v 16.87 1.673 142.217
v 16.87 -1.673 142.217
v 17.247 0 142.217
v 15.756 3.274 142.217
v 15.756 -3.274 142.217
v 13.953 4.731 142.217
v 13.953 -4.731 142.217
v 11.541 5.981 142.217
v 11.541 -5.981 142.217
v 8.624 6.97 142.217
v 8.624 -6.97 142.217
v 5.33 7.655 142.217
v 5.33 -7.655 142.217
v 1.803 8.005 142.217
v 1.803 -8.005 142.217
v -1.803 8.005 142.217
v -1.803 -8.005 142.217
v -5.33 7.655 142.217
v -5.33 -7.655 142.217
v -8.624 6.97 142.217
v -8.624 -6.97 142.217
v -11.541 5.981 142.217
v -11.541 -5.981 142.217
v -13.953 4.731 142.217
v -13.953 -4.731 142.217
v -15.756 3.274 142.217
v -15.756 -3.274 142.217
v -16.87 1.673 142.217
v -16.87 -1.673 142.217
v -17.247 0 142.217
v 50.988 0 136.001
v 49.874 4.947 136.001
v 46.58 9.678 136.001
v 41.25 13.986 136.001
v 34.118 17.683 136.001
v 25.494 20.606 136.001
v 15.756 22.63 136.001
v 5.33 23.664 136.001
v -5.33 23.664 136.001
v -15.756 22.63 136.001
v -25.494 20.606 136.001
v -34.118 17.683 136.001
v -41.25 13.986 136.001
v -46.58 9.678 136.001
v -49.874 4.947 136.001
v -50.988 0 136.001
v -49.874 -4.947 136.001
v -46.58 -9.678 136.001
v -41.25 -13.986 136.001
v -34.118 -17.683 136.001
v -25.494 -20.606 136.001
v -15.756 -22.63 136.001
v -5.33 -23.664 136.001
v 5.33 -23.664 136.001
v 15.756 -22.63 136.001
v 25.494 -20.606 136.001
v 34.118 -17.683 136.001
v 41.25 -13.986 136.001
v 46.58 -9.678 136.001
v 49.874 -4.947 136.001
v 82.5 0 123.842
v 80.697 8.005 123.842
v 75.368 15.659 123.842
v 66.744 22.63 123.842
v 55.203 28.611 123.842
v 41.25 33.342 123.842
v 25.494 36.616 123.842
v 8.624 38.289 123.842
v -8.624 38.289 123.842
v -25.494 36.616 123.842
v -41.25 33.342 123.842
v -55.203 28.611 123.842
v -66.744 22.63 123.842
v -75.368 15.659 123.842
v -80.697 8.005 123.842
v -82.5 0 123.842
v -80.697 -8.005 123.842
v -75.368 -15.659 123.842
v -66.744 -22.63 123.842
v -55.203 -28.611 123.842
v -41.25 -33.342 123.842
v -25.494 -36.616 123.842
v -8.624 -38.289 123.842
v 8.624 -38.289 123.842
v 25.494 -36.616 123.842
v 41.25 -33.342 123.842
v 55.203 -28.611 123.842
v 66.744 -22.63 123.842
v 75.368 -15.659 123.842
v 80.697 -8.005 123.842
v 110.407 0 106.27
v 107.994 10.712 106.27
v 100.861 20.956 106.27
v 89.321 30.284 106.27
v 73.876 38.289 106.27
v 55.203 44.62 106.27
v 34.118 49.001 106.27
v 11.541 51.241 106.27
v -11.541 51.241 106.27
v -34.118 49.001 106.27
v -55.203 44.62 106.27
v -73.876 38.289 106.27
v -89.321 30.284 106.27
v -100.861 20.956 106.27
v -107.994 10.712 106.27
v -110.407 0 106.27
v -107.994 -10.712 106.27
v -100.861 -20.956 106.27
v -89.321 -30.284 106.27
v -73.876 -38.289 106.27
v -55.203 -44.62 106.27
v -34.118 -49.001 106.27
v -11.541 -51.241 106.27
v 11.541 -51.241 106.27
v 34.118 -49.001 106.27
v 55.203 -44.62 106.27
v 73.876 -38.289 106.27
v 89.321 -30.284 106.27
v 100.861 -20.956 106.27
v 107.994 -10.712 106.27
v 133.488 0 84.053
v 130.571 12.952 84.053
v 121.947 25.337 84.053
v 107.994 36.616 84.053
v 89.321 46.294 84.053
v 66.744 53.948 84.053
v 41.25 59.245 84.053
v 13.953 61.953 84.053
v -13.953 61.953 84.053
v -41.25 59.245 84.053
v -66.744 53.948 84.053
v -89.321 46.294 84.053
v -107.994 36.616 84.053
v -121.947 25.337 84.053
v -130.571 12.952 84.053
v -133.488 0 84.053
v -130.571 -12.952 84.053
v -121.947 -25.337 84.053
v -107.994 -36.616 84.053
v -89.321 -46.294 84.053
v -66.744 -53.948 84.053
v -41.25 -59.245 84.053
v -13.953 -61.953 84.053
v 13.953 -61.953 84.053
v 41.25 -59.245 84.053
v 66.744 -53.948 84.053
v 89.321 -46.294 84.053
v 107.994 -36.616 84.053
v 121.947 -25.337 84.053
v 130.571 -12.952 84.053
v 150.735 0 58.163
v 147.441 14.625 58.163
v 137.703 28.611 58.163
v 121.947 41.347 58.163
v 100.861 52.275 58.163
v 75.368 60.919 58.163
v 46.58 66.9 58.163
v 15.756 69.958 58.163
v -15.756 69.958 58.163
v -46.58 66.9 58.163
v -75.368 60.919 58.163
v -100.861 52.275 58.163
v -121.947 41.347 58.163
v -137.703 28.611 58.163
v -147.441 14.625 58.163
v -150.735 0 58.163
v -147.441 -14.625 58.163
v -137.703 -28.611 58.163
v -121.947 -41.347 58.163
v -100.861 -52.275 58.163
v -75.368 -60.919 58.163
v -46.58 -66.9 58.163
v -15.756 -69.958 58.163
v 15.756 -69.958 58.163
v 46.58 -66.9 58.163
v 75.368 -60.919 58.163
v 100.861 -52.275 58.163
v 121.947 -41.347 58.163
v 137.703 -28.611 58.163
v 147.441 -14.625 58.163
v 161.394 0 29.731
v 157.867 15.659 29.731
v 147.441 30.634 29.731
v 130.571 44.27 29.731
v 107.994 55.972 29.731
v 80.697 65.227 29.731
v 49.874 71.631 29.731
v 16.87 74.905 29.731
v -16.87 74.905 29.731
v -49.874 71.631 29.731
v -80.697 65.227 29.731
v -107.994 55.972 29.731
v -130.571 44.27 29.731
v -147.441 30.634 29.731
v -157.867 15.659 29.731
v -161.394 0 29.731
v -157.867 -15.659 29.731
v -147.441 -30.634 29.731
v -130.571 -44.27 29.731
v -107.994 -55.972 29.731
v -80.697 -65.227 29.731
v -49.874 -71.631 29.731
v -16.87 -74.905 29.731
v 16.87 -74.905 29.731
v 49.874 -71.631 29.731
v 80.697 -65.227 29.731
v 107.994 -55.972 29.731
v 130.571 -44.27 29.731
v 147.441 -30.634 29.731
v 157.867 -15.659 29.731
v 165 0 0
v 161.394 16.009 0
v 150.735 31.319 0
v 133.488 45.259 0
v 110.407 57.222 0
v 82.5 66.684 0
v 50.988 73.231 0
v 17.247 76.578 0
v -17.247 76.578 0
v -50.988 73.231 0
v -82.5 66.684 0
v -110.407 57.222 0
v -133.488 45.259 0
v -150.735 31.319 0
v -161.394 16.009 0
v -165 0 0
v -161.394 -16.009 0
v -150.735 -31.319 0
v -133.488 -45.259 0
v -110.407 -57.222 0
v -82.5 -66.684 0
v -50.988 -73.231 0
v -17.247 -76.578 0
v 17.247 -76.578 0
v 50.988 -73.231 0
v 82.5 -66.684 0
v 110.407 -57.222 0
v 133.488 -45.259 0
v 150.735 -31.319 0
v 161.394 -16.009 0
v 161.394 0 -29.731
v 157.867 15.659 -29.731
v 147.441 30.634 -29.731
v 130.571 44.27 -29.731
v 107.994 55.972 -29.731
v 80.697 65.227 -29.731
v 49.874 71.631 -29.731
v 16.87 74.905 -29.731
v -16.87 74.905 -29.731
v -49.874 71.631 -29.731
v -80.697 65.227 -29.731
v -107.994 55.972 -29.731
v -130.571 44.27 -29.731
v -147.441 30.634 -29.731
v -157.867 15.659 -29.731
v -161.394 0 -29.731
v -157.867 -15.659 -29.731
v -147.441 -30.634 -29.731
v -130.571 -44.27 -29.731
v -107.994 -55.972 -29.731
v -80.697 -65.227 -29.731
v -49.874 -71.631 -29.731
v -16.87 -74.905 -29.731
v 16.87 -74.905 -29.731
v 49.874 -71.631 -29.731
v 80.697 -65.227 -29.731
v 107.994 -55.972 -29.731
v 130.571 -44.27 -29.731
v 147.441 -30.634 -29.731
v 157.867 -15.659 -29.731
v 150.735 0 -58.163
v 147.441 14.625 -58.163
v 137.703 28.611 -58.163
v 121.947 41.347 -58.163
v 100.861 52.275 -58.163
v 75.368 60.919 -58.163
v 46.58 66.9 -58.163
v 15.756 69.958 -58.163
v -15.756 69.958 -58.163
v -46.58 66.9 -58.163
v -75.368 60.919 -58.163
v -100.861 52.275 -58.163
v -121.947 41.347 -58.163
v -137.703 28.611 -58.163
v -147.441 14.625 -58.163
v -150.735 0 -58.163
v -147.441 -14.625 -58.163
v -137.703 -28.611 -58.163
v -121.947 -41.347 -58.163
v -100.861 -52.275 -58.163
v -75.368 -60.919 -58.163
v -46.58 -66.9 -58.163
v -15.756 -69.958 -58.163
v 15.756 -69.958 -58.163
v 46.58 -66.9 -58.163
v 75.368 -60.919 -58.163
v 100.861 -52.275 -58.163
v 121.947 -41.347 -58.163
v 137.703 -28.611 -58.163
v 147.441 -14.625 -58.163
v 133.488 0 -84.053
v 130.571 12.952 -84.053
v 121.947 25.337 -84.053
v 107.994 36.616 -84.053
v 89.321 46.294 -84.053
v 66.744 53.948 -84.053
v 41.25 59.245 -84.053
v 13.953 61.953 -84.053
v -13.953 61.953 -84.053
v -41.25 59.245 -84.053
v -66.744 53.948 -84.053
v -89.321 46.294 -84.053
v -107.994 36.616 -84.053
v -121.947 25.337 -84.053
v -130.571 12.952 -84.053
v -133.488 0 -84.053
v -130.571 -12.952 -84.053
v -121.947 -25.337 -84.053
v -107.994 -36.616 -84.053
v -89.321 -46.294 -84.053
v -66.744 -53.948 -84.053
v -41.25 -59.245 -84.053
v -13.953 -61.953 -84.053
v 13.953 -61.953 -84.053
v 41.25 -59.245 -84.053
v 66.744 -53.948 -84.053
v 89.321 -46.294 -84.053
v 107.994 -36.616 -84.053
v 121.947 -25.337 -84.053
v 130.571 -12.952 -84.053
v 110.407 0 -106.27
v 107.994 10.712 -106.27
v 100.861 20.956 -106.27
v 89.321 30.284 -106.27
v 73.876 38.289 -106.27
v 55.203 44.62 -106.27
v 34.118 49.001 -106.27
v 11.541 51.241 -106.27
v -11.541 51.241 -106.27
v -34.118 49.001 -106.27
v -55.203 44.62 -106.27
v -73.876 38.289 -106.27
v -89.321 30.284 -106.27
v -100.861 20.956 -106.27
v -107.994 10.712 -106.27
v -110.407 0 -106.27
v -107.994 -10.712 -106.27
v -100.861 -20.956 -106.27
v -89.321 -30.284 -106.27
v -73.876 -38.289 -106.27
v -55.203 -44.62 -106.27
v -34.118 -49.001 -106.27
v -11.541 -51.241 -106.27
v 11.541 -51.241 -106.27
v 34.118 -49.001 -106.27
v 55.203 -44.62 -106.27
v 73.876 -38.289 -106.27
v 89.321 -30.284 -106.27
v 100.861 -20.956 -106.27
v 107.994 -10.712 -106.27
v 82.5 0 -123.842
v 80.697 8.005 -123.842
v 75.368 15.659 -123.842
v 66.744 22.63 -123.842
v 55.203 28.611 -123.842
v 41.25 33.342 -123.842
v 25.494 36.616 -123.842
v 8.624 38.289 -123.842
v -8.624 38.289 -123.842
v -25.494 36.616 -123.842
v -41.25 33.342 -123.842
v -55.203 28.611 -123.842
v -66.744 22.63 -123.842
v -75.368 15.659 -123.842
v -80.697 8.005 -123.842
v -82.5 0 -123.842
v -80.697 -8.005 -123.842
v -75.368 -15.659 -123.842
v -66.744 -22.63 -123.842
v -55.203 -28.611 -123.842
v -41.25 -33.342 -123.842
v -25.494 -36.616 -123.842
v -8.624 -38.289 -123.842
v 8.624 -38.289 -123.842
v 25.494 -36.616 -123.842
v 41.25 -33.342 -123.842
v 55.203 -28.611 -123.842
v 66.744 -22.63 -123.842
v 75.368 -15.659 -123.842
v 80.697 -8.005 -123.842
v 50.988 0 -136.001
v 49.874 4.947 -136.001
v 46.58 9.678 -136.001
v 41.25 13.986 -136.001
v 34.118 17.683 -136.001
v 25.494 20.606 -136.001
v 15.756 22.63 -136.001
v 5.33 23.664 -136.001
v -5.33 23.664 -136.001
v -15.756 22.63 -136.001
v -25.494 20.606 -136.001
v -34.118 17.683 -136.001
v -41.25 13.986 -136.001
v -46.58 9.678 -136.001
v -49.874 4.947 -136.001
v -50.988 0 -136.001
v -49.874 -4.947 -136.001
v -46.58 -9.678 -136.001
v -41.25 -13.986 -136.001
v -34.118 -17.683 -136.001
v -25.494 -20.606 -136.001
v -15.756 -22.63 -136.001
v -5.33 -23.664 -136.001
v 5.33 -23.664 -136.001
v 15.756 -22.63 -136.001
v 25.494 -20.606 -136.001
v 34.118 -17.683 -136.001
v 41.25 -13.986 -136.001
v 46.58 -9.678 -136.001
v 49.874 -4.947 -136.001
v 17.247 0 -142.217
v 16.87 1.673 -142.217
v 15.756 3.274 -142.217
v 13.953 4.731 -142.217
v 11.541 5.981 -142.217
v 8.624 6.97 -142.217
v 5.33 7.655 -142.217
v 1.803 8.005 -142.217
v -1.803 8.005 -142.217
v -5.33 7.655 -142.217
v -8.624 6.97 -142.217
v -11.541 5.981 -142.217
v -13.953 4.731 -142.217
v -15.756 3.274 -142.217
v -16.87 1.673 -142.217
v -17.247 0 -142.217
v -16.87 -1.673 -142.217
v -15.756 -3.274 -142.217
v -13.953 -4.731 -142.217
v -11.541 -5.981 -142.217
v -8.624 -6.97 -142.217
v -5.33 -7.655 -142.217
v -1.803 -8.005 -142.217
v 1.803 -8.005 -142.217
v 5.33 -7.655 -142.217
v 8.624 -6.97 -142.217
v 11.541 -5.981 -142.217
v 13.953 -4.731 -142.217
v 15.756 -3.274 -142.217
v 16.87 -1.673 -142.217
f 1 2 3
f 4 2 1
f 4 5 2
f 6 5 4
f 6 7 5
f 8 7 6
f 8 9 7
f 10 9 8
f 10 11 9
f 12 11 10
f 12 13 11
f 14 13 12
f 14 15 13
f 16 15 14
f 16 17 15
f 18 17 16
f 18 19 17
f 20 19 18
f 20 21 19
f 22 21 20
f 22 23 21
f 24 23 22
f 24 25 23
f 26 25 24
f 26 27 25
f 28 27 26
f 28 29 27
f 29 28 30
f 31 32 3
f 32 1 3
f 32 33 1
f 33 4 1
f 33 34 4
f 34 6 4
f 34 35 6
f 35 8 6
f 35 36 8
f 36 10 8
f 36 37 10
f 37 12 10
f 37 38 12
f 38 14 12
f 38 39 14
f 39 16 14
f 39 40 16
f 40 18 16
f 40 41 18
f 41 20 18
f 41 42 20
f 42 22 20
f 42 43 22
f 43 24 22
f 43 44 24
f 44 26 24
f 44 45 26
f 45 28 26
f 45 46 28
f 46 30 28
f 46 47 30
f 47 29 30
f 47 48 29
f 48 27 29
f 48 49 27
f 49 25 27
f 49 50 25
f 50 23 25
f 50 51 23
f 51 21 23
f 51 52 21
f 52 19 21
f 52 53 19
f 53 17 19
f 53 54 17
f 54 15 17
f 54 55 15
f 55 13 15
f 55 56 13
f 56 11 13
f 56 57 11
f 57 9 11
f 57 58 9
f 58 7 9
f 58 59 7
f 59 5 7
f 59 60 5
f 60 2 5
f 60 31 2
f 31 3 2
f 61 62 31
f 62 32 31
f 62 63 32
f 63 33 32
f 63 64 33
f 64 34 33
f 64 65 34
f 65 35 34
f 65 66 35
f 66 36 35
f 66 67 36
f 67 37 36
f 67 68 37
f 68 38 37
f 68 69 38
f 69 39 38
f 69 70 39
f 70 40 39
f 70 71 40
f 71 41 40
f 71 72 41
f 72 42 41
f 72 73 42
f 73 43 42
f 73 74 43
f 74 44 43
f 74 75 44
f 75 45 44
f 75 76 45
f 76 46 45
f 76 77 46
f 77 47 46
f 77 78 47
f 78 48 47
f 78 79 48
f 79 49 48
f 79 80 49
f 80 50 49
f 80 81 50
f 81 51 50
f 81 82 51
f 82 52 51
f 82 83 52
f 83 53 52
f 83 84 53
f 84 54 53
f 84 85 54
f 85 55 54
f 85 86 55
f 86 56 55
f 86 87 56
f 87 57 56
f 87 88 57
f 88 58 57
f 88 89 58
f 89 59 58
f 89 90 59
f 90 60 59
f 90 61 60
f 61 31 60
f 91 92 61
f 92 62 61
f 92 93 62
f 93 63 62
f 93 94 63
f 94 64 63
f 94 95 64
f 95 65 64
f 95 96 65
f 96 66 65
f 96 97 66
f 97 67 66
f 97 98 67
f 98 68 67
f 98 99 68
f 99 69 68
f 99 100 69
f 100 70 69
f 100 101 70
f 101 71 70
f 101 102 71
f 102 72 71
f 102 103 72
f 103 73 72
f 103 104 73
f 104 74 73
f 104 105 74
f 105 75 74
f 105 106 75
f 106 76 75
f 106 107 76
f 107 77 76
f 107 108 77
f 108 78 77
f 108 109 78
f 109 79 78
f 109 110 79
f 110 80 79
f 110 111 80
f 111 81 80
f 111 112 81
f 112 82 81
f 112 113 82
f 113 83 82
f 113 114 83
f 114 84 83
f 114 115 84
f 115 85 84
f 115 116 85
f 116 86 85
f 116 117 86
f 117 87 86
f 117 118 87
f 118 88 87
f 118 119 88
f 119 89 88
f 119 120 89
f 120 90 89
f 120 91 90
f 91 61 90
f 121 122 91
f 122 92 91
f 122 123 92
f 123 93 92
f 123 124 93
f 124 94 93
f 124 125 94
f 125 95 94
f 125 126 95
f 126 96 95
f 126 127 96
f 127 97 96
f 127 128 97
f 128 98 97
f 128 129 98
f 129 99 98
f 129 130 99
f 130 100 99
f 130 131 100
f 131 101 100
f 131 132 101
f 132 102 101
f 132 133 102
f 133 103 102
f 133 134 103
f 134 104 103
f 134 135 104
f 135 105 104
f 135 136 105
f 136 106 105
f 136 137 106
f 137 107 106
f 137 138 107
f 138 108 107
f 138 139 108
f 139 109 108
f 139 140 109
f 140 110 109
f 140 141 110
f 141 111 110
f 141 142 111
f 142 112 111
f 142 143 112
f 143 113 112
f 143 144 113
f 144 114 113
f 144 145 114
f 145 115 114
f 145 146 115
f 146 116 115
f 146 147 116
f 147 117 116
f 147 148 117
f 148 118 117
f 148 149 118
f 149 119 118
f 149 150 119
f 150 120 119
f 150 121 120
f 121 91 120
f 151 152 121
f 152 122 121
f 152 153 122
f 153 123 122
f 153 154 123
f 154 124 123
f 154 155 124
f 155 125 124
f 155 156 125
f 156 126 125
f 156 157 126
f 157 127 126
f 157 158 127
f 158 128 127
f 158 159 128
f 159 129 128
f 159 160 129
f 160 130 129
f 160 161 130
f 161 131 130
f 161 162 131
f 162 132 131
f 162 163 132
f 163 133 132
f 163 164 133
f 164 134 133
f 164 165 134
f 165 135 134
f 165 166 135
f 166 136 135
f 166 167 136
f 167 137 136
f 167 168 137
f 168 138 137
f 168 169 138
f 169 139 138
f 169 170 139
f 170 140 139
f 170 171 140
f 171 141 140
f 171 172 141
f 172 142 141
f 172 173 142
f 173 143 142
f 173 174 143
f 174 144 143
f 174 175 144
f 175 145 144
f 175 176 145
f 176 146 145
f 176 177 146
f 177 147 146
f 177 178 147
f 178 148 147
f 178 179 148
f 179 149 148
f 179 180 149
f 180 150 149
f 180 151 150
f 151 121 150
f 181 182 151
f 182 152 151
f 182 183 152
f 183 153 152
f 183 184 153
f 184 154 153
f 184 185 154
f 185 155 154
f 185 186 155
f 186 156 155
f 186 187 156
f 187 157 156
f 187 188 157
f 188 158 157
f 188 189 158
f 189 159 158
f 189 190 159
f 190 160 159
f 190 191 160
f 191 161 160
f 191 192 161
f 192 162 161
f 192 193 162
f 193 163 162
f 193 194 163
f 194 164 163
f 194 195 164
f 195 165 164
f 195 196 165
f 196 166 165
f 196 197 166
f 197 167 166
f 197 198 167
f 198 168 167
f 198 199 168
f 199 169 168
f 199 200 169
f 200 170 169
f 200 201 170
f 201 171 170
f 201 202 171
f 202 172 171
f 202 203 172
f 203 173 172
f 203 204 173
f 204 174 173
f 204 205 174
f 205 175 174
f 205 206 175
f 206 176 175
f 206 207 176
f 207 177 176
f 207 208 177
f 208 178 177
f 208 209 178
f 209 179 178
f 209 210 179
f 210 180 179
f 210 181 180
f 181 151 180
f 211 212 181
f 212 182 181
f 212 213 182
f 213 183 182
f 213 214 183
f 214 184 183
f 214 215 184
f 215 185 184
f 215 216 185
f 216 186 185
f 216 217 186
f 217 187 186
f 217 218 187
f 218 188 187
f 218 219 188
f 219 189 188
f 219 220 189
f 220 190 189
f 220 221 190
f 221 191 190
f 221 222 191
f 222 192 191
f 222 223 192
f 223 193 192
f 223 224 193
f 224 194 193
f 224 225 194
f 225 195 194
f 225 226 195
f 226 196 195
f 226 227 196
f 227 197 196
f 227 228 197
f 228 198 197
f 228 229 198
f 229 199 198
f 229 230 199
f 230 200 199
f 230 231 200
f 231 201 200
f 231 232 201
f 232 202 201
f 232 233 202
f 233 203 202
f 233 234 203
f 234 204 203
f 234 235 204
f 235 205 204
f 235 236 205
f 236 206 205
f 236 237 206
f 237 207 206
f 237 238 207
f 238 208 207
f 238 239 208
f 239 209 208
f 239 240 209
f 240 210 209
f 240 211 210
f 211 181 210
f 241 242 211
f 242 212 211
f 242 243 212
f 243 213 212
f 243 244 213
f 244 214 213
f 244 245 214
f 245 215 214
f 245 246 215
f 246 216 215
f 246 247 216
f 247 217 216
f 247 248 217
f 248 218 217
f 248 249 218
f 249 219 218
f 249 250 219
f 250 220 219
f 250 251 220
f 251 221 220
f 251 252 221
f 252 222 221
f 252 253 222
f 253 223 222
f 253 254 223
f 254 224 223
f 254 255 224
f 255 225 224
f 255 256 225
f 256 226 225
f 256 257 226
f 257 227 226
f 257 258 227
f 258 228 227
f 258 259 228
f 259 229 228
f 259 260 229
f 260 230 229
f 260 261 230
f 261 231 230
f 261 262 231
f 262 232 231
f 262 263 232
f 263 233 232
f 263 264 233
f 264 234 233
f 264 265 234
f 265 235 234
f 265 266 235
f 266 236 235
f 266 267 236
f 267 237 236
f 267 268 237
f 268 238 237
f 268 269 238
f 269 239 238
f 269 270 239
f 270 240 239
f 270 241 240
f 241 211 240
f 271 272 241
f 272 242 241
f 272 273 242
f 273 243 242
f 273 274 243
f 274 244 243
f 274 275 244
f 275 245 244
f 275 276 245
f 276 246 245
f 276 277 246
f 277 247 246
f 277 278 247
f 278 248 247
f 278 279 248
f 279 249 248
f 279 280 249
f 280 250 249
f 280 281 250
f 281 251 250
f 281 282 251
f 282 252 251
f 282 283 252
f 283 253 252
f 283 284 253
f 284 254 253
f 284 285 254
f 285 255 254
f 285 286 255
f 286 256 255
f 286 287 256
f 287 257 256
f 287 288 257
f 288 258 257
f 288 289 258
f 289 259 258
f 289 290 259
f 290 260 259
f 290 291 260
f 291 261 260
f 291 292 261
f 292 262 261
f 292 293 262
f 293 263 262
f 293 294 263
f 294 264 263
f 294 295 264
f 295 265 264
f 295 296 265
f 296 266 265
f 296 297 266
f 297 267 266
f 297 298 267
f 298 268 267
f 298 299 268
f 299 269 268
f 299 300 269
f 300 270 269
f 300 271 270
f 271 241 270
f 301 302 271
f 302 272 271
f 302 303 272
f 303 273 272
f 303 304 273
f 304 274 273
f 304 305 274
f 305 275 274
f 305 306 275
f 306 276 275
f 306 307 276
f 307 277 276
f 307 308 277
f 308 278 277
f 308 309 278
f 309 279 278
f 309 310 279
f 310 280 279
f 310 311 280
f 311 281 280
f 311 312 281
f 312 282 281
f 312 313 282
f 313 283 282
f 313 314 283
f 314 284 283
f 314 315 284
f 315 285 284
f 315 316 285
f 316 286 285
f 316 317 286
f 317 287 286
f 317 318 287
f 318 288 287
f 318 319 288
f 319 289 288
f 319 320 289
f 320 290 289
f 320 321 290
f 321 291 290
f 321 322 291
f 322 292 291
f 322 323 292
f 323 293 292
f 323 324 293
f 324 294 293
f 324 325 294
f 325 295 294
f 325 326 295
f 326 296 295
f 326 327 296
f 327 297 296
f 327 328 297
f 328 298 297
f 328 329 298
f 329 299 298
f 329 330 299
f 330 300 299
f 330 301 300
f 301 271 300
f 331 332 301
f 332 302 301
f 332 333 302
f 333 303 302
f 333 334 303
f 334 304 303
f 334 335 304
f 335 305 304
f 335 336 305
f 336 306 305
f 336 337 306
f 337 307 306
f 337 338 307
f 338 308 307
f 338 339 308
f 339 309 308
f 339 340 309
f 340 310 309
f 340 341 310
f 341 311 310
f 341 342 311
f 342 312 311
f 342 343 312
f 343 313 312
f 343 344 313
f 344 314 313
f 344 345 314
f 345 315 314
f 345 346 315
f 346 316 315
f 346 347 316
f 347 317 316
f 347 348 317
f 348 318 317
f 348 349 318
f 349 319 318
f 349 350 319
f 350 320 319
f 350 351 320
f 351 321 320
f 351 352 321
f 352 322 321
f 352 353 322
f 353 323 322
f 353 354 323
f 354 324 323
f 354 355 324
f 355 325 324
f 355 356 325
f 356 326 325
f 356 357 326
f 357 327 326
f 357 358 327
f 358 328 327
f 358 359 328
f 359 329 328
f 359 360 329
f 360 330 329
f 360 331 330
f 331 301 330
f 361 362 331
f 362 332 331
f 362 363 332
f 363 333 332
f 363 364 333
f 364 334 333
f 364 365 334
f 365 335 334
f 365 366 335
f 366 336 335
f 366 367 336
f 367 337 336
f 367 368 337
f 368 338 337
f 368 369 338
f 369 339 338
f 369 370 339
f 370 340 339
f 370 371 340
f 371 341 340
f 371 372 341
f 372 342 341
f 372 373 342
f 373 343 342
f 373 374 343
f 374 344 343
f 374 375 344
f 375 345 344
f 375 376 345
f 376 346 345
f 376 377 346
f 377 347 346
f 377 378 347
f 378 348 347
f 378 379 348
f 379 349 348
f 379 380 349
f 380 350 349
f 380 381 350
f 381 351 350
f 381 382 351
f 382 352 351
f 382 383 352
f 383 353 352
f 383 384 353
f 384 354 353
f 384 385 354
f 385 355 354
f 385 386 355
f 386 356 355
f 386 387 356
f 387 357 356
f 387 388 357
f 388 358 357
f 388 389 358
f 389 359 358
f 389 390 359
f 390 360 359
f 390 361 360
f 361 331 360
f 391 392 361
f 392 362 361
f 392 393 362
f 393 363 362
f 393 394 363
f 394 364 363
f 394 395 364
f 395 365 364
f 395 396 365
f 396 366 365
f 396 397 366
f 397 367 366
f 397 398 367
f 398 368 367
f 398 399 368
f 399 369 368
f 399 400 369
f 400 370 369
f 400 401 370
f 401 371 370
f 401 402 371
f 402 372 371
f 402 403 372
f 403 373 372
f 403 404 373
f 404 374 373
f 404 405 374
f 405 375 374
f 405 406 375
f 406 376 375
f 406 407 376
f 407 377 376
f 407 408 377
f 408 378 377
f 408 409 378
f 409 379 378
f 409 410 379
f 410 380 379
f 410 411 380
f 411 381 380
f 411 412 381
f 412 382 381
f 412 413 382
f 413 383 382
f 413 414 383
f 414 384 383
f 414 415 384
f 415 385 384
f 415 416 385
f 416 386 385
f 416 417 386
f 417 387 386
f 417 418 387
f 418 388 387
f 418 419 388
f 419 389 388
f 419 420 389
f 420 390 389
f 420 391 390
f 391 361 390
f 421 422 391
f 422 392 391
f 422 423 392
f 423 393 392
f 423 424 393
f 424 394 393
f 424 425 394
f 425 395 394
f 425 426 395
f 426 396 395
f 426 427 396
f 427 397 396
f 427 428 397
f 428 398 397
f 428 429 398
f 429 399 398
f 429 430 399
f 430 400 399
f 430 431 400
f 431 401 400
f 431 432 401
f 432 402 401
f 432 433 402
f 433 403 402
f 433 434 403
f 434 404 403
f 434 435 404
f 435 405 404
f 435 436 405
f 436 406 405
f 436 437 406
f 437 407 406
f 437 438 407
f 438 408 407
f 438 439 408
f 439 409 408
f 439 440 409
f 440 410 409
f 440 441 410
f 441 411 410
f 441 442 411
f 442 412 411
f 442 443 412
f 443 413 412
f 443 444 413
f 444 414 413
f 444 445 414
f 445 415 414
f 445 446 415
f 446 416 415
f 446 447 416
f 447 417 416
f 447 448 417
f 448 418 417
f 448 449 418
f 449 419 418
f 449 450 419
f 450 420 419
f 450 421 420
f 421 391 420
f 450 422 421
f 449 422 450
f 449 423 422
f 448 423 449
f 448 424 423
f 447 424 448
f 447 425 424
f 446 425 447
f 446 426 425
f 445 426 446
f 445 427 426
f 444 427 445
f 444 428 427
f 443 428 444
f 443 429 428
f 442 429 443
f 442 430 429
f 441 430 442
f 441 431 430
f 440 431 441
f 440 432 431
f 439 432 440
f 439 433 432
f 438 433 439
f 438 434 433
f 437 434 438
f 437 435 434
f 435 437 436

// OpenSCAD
// Generated by SolidPython 1.0.1 on 2020-07-29 00:46:51


scale(v = [15, 7, 13]) {
	sphere(r = 11);
}
/***********************************************
*********      SolidPython code:      **********
************************************************
 
# import packages: SolidPython
from solid import *
from solid.utils import *
from itertools import chain, combinations, permutations


class Resize:

    def __init__(self, scad_file):
        self.scad_file = scad_file
        #self.scad_file = import_scad(scad_file)
        # cone/cylinder param:
        self.r1 = 0
        self.r2 = 0
        self.h = 0
        # rectangular prism param:
        self.w = 0
        self.l = 0
        # ellipse param:
        self.r = 0

    # import OpenScad code (file name corresponds to shape)


    # classify shape + parameters
    def assign(self, param1, param2, param3):
        if self.scad_file == 'cone.scad':
            self.r1 = param1
            self.r2 = param2
            self.h = param3
        elif self.scad_file == 'cylinder.scad':
            self.r1 = param1
            self.r2 = param2
            self.h = param3
        elif self.scad_file == 'rectangularPrism.scad':
            self.h = param1
            self.l = param2
            self.w = param3
        else:
            self.r = param1
            self.h = param2

    # resize parameters
    def iterate(self):
        x = range(3, 20, 2)
        i = 1
        if self.scad_file == 'cone.scad':
            tempList = list(permutations(x, 2))
            for temp in tempList:
                param1 = temp[0]
                param2 = temp[1]
                filepath = 'produced_scad_files/' + 'cone' + str(param1) + '_' + str(param2) + '_' + '.scad'
                scad_render_to_file(cylinder(h=param1, r1=param2, r2=0), filepath)

        elif self.scad_file == 'cylinder.scad':
            tempList = list(permutations(x, 3))
            for temp in tempList:
                param1 = temp[0]
                param2 = temp[1]
                filepath = 'produced_scad_files/' + 'cylinder' + str(param1) + '_' + str(param2) + '_' + '.scad'
                scad_render_to_file(cylinder(h=param1, r1=param2, r2=param2), filepath)

        elif self.scad_file == 'rectangularPrism.scad':
            tempList = list(permutations(x, 3))
            for temp in tempList:
                param1 = temp[0]
                param2 = temp[1]
                param3 = temp[2]
                filepath = 'produced_scad_files/' + 'rectangularPrism' + str(param1) + '_' + str(param2) + '_' + str(
                    param3) + '.scad'
                scad_render_to_file(cube(size=(param1, param2, param3)), filepath)

        elif self.scad_file == 'ellipse.scad':
            tempList = list(permutations(x, 4))
            for temp in tempList:
                param1 = temp[0]
                param2 = temp[1]
                param3 = temp[2]
                param4 = temp[3]
                filepath = 'produced_scad_files/' + 'ellipse' + str(param1) + '_' + str(param2) + '_' + str(param3) + '_' + str(param4) + '.scad'
                scad_render_to_file(scale([param1, param2, param3])(sphere(r=param4)), filepath)

    def render_to_scadfile(self):
        scad_render_to_file(scad, 'example.scad') 
 
************************************************/
